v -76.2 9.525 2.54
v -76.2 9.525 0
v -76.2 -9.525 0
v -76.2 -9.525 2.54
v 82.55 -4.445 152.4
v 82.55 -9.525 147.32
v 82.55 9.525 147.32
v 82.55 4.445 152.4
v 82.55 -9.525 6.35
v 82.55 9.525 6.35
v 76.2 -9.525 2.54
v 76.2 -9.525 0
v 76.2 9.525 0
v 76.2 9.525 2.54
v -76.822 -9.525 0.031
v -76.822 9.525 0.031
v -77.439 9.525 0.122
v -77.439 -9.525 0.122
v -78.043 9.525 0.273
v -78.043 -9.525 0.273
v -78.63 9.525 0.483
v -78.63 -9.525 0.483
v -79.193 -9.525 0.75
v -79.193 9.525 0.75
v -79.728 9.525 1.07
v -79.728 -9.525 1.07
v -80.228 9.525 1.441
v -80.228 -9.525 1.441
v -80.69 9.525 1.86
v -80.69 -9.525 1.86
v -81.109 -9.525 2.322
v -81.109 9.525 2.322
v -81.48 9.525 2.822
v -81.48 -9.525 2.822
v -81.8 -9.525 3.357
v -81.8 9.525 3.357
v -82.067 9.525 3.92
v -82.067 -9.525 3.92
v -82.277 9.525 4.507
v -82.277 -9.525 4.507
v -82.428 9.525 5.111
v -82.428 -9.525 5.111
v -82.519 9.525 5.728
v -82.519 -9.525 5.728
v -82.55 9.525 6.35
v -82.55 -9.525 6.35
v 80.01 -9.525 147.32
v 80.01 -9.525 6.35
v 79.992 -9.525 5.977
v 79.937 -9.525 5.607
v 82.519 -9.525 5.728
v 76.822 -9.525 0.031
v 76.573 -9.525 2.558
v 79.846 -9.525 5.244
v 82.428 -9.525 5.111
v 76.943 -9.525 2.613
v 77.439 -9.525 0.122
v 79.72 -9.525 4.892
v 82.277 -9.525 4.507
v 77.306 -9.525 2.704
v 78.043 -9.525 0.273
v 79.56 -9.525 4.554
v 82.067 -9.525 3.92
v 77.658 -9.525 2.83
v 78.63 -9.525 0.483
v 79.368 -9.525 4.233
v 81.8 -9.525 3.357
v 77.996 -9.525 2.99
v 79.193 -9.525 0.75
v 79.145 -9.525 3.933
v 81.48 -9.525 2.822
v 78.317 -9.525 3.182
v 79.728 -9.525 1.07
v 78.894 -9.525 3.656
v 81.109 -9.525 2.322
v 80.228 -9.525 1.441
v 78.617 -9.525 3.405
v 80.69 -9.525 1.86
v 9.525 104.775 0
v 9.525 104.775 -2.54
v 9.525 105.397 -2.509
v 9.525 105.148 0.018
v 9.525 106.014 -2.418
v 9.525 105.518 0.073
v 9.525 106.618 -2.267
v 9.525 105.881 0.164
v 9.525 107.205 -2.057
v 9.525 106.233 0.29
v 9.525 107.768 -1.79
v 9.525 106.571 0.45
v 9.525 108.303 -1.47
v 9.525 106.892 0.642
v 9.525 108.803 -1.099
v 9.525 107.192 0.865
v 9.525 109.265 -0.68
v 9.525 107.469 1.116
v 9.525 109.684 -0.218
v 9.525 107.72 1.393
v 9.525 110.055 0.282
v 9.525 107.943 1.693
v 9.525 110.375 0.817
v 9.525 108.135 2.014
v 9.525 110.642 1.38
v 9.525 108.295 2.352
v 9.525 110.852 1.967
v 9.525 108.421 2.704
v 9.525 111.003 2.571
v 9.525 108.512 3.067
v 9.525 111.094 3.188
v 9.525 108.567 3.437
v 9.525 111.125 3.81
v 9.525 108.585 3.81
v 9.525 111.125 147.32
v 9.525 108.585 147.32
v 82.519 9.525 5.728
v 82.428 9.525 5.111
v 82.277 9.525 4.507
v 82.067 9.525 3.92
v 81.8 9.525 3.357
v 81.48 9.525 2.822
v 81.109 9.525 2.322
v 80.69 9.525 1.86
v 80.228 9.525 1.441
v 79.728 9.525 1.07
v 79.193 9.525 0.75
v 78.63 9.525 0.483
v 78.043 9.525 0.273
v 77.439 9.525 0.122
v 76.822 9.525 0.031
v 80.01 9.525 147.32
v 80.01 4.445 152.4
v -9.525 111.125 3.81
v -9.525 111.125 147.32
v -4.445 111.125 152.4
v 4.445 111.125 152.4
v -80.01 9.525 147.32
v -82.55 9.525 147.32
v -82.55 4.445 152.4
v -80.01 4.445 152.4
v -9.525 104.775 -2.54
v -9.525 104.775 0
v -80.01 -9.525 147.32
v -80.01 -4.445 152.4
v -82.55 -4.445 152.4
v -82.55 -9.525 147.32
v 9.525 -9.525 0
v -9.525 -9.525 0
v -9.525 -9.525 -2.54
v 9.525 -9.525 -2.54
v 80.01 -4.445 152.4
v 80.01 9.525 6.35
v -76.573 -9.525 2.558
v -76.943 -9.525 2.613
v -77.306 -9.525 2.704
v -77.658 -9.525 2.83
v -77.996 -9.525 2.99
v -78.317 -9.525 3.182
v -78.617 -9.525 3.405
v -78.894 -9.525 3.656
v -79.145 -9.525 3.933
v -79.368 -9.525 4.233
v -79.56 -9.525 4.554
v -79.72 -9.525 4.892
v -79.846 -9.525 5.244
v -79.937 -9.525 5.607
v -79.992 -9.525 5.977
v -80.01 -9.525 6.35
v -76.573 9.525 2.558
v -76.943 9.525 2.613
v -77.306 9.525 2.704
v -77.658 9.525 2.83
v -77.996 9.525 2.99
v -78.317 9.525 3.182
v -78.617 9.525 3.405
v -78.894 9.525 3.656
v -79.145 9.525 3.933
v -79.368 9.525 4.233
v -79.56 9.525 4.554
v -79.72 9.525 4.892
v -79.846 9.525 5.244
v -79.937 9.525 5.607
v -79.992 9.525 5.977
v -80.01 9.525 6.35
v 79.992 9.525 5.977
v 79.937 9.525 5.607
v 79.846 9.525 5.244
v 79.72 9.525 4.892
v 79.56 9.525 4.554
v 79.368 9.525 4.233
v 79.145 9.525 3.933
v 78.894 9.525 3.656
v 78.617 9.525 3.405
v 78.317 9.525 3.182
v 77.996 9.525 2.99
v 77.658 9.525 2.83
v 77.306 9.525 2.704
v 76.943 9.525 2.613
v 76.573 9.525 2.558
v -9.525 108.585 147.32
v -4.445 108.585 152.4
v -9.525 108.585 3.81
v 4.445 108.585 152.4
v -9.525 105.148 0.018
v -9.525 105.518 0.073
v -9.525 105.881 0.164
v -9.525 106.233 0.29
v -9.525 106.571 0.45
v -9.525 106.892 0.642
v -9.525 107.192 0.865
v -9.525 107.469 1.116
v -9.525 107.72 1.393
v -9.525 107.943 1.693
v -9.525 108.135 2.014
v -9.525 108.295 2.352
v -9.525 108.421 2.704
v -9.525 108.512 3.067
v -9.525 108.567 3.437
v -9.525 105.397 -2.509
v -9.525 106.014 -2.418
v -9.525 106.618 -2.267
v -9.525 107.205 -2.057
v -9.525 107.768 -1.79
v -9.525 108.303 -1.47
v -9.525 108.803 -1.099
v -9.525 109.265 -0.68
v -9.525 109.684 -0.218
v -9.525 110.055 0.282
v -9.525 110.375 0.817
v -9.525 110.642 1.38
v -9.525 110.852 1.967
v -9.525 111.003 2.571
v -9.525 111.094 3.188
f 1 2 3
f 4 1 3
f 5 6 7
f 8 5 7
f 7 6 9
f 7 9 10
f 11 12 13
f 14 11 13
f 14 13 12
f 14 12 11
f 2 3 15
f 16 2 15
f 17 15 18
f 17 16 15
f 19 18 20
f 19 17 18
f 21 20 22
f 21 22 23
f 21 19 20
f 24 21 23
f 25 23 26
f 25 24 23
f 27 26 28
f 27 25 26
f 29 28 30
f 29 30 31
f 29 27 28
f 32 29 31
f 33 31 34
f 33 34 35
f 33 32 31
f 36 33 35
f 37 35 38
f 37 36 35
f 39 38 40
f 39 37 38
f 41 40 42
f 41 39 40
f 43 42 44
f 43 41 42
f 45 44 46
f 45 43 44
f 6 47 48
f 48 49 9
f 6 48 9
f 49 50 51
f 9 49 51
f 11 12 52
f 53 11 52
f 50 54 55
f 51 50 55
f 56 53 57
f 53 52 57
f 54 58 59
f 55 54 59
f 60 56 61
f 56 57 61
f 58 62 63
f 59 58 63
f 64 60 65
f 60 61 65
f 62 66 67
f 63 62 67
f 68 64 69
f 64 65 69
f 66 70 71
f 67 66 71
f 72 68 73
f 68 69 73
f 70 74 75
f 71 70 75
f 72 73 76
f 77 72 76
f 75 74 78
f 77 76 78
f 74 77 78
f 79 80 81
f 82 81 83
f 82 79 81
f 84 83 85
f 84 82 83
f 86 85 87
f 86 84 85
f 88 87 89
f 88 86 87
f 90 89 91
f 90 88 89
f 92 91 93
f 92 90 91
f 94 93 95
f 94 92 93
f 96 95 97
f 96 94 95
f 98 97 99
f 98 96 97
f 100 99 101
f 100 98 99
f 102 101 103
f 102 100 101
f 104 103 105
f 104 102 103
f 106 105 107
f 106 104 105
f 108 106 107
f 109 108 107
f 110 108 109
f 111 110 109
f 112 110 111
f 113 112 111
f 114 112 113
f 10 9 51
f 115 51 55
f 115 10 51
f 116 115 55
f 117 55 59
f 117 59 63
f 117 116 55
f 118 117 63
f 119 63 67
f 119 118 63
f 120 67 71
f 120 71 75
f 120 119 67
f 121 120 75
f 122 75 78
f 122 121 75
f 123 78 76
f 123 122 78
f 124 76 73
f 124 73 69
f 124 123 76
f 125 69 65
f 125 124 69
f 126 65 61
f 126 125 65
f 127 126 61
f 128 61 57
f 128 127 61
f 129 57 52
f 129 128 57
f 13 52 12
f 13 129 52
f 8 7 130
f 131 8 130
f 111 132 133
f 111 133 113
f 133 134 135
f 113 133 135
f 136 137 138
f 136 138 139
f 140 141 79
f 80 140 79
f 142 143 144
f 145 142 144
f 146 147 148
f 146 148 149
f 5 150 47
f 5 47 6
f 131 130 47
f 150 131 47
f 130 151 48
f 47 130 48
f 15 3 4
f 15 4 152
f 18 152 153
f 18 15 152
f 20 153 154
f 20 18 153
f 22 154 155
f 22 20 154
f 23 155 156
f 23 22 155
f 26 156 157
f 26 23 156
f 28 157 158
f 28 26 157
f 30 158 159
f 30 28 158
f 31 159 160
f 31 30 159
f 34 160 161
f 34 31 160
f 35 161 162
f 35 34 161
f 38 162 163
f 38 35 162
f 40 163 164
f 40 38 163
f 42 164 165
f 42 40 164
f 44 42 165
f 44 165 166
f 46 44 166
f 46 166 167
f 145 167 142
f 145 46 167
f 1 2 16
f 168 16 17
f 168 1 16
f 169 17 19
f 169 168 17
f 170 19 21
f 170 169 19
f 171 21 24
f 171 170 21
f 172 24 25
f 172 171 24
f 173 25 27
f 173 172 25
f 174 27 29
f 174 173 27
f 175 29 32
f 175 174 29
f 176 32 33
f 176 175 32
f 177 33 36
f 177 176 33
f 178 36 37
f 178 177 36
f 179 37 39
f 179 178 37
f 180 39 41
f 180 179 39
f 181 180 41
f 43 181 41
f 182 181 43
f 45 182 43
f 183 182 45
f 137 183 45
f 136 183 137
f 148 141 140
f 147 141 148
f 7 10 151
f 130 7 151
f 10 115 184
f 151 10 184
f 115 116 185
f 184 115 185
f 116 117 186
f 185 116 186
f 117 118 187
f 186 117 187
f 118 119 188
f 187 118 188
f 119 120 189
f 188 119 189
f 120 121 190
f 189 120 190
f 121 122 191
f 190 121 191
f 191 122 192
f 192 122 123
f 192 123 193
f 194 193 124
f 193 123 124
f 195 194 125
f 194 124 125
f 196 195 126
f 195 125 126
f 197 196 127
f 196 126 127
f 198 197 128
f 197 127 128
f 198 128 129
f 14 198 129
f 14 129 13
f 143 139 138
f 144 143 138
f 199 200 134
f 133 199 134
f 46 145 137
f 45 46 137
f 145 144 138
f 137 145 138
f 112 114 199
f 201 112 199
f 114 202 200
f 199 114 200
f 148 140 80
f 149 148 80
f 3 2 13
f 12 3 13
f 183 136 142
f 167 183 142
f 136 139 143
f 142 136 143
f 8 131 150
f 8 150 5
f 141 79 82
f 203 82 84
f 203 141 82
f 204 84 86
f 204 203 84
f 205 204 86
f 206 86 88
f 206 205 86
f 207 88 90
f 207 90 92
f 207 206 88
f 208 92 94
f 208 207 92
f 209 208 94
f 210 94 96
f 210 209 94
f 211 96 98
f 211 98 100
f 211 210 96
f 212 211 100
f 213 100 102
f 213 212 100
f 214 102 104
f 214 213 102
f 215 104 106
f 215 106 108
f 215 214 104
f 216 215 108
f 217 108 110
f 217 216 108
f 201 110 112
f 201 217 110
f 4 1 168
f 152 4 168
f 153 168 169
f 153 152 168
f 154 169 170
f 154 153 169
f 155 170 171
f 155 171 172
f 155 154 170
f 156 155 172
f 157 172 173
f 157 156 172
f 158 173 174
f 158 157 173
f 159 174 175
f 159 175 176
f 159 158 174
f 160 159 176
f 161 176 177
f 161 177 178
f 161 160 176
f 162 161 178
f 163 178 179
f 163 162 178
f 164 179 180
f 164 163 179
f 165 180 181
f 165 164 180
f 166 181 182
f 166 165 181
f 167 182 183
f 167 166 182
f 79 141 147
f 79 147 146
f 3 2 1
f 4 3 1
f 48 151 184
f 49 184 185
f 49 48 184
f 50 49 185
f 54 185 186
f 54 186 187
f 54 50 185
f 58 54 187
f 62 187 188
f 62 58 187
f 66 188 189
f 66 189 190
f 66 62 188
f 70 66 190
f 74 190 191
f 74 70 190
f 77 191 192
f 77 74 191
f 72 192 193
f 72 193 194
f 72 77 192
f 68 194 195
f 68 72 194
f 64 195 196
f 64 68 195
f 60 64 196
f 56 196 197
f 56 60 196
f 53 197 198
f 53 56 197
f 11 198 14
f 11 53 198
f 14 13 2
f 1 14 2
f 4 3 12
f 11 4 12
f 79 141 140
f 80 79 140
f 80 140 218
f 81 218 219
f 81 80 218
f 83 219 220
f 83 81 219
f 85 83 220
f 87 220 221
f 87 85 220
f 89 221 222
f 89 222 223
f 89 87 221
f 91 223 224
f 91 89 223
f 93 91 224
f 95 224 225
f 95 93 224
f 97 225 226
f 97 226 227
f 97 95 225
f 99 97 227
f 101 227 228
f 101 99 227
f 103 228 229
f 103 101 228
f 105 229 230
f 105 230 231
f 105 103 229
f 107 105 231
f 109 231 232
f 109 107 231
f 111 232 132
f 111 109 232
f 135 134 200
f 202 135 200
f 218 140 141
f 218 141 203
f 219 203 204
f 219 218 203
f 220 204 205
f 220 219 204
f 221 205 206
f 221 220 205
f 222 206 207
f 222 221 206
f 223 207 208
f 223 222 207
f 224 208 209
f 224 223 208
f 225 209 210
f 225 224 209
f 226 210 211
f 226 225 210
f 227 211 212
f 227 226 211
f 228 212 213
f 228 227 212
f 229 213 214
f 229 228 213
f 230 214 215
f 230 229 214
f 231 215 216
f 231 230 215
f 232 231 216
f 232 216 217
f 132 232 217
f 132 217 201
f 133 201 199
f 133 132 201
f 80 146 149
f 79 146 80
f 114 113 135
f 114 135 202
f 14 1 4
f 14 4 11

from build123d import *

# Parameters (mm, degrees)
F0_W       = 66.675
F0_H       = 19.05
F8_DEPTH   = 2.54
F0_W_2     = 19.05
F0_H_2     = 95.25
F13_DEPTH  = 2.54
F14_SIZE   = 5.08
F14_2_SIZE = 5.08
F14_3_SIZE = 5.08


with BuildPart() as f4:
    # F4: sweep along a path in F1
    with BuildLine(Plane.XZ) as f4_path:
        Line((82.55, 152.4), (82.55, 6.35))
        ThreePointArc((82.55, 6.35), (80.6901280605, 1.8598719395), (76.2, 0))
    # F3 (on offset) → F4 (sweep)
    with BuildSketch(Plane.YZ.offset(76.2)):
        Polygon((-9.525, 0), (0, 0), (9.525, 0), (9.525, 2.54), (-9.525, 2.54), align=None)
    sweep(path=f4_path.line)

    # F14
    f14_edges = [f4.edges().sort_by_distance(p)[0] for p in [
        (81.28, -9.525, 152.4),
        (81.28, 9.525, 152.4),
    ]]
    chamfer(f14_edges, length=F14_SIZE)


with BuildPart() as f7:
    # F7: sweep along a path in F1
    with BuildLine(Plane.XZ) as f7_path:
        ThreePointArc((-76.2, 0), (-80.6901280605, 1.8598719395), (-82.55, 6.35))
        Line((-82.55, 6.35), (-82.55, 152.4))
    # F6 (on offset) → F7 (sweep)
    with BuildSketch(Plane.YZ.offset(-76.2)):
        Polygon((-9.525, 0), (0, 0), (9.525, 0), (9.525, 2.54), (-9.525, 2.54), align=None)
    sweep(path=f7_path.line)

    # F14#2
    f14_2_edges = [f7.edges().sort_by_distance(p)[0] for p in [
        (-81.28, -9.525, 152.4),
        (-81.28, 9.525, 152.4),
    ]]
    chamfer(f14_2_edges, length=F14_2_SIZE)


with BuildPart() as f8:
    # F0 (on Top) → F8 (new body)
    with BuildSketch(Plane.XY):
        with Locations((42.8625, 0)):
            Rectangle(F0_W, F0_H)
        Polygon((9.525, -9.525), (9.525, 9.525), (-9.525, 9.525), (-9.525, 0), (-9.525, -9.525), align=None)
        Polygon((-9.525, 0), (-9.525, 9.525), (-76.2, 9.525), (-76.2, -9.525), (-9.525, -9.525), align=None)
    extrude(amount=F8_DEPTH)


with BuildPart() as f12:
    # F12: sweep along a path in F11
    with BuildLine(Plane.YZ) as f12_path:
        ThreePointArc((104.775, -2.54), (109.2651280605, -0.6801280605), (111.125, 3.81))
        Line((111.125, 3.81), (111.125, 152.4))
    # F10 (on offset) → F12 (sweep)
    with BuildSketch(Plane.XZ.offset(-104.775)):
        Polygon((9.525, 0), (0, 0), (-9.525, 0), (-9.525, -2.54), (9.525, -2.54), align=None)
    sweep(path=f12_path.line)

    # F14#3
    f14_3_edges = [f12.edges().sort_by_distance(p)[0] for p in [
        (9.525, 109.855, 152.4),
        (-9.525, 109.855, 152.4),
    ]]
    chamfer(f14_3_edges, length=F14_3_SIZE)


with BuildPart() as f13:
    # F0 (on Top) → F13 (new body)
    with BuildSketch(Plane.XY):
        Polygon((9.525, -9.525), (9.525, 9.525), (-9.525, 9.525), (-9.525, 0), (-9.525, -9.525), align=None)
        with Locations((0, 57.15)):
            Rectangle(F0_W_2, F0_H_2)
    extrude(amount=-F13_DEPTH)


solid = Compound([f4.part, f7.part, f8.part, f12.part, f13.part])
